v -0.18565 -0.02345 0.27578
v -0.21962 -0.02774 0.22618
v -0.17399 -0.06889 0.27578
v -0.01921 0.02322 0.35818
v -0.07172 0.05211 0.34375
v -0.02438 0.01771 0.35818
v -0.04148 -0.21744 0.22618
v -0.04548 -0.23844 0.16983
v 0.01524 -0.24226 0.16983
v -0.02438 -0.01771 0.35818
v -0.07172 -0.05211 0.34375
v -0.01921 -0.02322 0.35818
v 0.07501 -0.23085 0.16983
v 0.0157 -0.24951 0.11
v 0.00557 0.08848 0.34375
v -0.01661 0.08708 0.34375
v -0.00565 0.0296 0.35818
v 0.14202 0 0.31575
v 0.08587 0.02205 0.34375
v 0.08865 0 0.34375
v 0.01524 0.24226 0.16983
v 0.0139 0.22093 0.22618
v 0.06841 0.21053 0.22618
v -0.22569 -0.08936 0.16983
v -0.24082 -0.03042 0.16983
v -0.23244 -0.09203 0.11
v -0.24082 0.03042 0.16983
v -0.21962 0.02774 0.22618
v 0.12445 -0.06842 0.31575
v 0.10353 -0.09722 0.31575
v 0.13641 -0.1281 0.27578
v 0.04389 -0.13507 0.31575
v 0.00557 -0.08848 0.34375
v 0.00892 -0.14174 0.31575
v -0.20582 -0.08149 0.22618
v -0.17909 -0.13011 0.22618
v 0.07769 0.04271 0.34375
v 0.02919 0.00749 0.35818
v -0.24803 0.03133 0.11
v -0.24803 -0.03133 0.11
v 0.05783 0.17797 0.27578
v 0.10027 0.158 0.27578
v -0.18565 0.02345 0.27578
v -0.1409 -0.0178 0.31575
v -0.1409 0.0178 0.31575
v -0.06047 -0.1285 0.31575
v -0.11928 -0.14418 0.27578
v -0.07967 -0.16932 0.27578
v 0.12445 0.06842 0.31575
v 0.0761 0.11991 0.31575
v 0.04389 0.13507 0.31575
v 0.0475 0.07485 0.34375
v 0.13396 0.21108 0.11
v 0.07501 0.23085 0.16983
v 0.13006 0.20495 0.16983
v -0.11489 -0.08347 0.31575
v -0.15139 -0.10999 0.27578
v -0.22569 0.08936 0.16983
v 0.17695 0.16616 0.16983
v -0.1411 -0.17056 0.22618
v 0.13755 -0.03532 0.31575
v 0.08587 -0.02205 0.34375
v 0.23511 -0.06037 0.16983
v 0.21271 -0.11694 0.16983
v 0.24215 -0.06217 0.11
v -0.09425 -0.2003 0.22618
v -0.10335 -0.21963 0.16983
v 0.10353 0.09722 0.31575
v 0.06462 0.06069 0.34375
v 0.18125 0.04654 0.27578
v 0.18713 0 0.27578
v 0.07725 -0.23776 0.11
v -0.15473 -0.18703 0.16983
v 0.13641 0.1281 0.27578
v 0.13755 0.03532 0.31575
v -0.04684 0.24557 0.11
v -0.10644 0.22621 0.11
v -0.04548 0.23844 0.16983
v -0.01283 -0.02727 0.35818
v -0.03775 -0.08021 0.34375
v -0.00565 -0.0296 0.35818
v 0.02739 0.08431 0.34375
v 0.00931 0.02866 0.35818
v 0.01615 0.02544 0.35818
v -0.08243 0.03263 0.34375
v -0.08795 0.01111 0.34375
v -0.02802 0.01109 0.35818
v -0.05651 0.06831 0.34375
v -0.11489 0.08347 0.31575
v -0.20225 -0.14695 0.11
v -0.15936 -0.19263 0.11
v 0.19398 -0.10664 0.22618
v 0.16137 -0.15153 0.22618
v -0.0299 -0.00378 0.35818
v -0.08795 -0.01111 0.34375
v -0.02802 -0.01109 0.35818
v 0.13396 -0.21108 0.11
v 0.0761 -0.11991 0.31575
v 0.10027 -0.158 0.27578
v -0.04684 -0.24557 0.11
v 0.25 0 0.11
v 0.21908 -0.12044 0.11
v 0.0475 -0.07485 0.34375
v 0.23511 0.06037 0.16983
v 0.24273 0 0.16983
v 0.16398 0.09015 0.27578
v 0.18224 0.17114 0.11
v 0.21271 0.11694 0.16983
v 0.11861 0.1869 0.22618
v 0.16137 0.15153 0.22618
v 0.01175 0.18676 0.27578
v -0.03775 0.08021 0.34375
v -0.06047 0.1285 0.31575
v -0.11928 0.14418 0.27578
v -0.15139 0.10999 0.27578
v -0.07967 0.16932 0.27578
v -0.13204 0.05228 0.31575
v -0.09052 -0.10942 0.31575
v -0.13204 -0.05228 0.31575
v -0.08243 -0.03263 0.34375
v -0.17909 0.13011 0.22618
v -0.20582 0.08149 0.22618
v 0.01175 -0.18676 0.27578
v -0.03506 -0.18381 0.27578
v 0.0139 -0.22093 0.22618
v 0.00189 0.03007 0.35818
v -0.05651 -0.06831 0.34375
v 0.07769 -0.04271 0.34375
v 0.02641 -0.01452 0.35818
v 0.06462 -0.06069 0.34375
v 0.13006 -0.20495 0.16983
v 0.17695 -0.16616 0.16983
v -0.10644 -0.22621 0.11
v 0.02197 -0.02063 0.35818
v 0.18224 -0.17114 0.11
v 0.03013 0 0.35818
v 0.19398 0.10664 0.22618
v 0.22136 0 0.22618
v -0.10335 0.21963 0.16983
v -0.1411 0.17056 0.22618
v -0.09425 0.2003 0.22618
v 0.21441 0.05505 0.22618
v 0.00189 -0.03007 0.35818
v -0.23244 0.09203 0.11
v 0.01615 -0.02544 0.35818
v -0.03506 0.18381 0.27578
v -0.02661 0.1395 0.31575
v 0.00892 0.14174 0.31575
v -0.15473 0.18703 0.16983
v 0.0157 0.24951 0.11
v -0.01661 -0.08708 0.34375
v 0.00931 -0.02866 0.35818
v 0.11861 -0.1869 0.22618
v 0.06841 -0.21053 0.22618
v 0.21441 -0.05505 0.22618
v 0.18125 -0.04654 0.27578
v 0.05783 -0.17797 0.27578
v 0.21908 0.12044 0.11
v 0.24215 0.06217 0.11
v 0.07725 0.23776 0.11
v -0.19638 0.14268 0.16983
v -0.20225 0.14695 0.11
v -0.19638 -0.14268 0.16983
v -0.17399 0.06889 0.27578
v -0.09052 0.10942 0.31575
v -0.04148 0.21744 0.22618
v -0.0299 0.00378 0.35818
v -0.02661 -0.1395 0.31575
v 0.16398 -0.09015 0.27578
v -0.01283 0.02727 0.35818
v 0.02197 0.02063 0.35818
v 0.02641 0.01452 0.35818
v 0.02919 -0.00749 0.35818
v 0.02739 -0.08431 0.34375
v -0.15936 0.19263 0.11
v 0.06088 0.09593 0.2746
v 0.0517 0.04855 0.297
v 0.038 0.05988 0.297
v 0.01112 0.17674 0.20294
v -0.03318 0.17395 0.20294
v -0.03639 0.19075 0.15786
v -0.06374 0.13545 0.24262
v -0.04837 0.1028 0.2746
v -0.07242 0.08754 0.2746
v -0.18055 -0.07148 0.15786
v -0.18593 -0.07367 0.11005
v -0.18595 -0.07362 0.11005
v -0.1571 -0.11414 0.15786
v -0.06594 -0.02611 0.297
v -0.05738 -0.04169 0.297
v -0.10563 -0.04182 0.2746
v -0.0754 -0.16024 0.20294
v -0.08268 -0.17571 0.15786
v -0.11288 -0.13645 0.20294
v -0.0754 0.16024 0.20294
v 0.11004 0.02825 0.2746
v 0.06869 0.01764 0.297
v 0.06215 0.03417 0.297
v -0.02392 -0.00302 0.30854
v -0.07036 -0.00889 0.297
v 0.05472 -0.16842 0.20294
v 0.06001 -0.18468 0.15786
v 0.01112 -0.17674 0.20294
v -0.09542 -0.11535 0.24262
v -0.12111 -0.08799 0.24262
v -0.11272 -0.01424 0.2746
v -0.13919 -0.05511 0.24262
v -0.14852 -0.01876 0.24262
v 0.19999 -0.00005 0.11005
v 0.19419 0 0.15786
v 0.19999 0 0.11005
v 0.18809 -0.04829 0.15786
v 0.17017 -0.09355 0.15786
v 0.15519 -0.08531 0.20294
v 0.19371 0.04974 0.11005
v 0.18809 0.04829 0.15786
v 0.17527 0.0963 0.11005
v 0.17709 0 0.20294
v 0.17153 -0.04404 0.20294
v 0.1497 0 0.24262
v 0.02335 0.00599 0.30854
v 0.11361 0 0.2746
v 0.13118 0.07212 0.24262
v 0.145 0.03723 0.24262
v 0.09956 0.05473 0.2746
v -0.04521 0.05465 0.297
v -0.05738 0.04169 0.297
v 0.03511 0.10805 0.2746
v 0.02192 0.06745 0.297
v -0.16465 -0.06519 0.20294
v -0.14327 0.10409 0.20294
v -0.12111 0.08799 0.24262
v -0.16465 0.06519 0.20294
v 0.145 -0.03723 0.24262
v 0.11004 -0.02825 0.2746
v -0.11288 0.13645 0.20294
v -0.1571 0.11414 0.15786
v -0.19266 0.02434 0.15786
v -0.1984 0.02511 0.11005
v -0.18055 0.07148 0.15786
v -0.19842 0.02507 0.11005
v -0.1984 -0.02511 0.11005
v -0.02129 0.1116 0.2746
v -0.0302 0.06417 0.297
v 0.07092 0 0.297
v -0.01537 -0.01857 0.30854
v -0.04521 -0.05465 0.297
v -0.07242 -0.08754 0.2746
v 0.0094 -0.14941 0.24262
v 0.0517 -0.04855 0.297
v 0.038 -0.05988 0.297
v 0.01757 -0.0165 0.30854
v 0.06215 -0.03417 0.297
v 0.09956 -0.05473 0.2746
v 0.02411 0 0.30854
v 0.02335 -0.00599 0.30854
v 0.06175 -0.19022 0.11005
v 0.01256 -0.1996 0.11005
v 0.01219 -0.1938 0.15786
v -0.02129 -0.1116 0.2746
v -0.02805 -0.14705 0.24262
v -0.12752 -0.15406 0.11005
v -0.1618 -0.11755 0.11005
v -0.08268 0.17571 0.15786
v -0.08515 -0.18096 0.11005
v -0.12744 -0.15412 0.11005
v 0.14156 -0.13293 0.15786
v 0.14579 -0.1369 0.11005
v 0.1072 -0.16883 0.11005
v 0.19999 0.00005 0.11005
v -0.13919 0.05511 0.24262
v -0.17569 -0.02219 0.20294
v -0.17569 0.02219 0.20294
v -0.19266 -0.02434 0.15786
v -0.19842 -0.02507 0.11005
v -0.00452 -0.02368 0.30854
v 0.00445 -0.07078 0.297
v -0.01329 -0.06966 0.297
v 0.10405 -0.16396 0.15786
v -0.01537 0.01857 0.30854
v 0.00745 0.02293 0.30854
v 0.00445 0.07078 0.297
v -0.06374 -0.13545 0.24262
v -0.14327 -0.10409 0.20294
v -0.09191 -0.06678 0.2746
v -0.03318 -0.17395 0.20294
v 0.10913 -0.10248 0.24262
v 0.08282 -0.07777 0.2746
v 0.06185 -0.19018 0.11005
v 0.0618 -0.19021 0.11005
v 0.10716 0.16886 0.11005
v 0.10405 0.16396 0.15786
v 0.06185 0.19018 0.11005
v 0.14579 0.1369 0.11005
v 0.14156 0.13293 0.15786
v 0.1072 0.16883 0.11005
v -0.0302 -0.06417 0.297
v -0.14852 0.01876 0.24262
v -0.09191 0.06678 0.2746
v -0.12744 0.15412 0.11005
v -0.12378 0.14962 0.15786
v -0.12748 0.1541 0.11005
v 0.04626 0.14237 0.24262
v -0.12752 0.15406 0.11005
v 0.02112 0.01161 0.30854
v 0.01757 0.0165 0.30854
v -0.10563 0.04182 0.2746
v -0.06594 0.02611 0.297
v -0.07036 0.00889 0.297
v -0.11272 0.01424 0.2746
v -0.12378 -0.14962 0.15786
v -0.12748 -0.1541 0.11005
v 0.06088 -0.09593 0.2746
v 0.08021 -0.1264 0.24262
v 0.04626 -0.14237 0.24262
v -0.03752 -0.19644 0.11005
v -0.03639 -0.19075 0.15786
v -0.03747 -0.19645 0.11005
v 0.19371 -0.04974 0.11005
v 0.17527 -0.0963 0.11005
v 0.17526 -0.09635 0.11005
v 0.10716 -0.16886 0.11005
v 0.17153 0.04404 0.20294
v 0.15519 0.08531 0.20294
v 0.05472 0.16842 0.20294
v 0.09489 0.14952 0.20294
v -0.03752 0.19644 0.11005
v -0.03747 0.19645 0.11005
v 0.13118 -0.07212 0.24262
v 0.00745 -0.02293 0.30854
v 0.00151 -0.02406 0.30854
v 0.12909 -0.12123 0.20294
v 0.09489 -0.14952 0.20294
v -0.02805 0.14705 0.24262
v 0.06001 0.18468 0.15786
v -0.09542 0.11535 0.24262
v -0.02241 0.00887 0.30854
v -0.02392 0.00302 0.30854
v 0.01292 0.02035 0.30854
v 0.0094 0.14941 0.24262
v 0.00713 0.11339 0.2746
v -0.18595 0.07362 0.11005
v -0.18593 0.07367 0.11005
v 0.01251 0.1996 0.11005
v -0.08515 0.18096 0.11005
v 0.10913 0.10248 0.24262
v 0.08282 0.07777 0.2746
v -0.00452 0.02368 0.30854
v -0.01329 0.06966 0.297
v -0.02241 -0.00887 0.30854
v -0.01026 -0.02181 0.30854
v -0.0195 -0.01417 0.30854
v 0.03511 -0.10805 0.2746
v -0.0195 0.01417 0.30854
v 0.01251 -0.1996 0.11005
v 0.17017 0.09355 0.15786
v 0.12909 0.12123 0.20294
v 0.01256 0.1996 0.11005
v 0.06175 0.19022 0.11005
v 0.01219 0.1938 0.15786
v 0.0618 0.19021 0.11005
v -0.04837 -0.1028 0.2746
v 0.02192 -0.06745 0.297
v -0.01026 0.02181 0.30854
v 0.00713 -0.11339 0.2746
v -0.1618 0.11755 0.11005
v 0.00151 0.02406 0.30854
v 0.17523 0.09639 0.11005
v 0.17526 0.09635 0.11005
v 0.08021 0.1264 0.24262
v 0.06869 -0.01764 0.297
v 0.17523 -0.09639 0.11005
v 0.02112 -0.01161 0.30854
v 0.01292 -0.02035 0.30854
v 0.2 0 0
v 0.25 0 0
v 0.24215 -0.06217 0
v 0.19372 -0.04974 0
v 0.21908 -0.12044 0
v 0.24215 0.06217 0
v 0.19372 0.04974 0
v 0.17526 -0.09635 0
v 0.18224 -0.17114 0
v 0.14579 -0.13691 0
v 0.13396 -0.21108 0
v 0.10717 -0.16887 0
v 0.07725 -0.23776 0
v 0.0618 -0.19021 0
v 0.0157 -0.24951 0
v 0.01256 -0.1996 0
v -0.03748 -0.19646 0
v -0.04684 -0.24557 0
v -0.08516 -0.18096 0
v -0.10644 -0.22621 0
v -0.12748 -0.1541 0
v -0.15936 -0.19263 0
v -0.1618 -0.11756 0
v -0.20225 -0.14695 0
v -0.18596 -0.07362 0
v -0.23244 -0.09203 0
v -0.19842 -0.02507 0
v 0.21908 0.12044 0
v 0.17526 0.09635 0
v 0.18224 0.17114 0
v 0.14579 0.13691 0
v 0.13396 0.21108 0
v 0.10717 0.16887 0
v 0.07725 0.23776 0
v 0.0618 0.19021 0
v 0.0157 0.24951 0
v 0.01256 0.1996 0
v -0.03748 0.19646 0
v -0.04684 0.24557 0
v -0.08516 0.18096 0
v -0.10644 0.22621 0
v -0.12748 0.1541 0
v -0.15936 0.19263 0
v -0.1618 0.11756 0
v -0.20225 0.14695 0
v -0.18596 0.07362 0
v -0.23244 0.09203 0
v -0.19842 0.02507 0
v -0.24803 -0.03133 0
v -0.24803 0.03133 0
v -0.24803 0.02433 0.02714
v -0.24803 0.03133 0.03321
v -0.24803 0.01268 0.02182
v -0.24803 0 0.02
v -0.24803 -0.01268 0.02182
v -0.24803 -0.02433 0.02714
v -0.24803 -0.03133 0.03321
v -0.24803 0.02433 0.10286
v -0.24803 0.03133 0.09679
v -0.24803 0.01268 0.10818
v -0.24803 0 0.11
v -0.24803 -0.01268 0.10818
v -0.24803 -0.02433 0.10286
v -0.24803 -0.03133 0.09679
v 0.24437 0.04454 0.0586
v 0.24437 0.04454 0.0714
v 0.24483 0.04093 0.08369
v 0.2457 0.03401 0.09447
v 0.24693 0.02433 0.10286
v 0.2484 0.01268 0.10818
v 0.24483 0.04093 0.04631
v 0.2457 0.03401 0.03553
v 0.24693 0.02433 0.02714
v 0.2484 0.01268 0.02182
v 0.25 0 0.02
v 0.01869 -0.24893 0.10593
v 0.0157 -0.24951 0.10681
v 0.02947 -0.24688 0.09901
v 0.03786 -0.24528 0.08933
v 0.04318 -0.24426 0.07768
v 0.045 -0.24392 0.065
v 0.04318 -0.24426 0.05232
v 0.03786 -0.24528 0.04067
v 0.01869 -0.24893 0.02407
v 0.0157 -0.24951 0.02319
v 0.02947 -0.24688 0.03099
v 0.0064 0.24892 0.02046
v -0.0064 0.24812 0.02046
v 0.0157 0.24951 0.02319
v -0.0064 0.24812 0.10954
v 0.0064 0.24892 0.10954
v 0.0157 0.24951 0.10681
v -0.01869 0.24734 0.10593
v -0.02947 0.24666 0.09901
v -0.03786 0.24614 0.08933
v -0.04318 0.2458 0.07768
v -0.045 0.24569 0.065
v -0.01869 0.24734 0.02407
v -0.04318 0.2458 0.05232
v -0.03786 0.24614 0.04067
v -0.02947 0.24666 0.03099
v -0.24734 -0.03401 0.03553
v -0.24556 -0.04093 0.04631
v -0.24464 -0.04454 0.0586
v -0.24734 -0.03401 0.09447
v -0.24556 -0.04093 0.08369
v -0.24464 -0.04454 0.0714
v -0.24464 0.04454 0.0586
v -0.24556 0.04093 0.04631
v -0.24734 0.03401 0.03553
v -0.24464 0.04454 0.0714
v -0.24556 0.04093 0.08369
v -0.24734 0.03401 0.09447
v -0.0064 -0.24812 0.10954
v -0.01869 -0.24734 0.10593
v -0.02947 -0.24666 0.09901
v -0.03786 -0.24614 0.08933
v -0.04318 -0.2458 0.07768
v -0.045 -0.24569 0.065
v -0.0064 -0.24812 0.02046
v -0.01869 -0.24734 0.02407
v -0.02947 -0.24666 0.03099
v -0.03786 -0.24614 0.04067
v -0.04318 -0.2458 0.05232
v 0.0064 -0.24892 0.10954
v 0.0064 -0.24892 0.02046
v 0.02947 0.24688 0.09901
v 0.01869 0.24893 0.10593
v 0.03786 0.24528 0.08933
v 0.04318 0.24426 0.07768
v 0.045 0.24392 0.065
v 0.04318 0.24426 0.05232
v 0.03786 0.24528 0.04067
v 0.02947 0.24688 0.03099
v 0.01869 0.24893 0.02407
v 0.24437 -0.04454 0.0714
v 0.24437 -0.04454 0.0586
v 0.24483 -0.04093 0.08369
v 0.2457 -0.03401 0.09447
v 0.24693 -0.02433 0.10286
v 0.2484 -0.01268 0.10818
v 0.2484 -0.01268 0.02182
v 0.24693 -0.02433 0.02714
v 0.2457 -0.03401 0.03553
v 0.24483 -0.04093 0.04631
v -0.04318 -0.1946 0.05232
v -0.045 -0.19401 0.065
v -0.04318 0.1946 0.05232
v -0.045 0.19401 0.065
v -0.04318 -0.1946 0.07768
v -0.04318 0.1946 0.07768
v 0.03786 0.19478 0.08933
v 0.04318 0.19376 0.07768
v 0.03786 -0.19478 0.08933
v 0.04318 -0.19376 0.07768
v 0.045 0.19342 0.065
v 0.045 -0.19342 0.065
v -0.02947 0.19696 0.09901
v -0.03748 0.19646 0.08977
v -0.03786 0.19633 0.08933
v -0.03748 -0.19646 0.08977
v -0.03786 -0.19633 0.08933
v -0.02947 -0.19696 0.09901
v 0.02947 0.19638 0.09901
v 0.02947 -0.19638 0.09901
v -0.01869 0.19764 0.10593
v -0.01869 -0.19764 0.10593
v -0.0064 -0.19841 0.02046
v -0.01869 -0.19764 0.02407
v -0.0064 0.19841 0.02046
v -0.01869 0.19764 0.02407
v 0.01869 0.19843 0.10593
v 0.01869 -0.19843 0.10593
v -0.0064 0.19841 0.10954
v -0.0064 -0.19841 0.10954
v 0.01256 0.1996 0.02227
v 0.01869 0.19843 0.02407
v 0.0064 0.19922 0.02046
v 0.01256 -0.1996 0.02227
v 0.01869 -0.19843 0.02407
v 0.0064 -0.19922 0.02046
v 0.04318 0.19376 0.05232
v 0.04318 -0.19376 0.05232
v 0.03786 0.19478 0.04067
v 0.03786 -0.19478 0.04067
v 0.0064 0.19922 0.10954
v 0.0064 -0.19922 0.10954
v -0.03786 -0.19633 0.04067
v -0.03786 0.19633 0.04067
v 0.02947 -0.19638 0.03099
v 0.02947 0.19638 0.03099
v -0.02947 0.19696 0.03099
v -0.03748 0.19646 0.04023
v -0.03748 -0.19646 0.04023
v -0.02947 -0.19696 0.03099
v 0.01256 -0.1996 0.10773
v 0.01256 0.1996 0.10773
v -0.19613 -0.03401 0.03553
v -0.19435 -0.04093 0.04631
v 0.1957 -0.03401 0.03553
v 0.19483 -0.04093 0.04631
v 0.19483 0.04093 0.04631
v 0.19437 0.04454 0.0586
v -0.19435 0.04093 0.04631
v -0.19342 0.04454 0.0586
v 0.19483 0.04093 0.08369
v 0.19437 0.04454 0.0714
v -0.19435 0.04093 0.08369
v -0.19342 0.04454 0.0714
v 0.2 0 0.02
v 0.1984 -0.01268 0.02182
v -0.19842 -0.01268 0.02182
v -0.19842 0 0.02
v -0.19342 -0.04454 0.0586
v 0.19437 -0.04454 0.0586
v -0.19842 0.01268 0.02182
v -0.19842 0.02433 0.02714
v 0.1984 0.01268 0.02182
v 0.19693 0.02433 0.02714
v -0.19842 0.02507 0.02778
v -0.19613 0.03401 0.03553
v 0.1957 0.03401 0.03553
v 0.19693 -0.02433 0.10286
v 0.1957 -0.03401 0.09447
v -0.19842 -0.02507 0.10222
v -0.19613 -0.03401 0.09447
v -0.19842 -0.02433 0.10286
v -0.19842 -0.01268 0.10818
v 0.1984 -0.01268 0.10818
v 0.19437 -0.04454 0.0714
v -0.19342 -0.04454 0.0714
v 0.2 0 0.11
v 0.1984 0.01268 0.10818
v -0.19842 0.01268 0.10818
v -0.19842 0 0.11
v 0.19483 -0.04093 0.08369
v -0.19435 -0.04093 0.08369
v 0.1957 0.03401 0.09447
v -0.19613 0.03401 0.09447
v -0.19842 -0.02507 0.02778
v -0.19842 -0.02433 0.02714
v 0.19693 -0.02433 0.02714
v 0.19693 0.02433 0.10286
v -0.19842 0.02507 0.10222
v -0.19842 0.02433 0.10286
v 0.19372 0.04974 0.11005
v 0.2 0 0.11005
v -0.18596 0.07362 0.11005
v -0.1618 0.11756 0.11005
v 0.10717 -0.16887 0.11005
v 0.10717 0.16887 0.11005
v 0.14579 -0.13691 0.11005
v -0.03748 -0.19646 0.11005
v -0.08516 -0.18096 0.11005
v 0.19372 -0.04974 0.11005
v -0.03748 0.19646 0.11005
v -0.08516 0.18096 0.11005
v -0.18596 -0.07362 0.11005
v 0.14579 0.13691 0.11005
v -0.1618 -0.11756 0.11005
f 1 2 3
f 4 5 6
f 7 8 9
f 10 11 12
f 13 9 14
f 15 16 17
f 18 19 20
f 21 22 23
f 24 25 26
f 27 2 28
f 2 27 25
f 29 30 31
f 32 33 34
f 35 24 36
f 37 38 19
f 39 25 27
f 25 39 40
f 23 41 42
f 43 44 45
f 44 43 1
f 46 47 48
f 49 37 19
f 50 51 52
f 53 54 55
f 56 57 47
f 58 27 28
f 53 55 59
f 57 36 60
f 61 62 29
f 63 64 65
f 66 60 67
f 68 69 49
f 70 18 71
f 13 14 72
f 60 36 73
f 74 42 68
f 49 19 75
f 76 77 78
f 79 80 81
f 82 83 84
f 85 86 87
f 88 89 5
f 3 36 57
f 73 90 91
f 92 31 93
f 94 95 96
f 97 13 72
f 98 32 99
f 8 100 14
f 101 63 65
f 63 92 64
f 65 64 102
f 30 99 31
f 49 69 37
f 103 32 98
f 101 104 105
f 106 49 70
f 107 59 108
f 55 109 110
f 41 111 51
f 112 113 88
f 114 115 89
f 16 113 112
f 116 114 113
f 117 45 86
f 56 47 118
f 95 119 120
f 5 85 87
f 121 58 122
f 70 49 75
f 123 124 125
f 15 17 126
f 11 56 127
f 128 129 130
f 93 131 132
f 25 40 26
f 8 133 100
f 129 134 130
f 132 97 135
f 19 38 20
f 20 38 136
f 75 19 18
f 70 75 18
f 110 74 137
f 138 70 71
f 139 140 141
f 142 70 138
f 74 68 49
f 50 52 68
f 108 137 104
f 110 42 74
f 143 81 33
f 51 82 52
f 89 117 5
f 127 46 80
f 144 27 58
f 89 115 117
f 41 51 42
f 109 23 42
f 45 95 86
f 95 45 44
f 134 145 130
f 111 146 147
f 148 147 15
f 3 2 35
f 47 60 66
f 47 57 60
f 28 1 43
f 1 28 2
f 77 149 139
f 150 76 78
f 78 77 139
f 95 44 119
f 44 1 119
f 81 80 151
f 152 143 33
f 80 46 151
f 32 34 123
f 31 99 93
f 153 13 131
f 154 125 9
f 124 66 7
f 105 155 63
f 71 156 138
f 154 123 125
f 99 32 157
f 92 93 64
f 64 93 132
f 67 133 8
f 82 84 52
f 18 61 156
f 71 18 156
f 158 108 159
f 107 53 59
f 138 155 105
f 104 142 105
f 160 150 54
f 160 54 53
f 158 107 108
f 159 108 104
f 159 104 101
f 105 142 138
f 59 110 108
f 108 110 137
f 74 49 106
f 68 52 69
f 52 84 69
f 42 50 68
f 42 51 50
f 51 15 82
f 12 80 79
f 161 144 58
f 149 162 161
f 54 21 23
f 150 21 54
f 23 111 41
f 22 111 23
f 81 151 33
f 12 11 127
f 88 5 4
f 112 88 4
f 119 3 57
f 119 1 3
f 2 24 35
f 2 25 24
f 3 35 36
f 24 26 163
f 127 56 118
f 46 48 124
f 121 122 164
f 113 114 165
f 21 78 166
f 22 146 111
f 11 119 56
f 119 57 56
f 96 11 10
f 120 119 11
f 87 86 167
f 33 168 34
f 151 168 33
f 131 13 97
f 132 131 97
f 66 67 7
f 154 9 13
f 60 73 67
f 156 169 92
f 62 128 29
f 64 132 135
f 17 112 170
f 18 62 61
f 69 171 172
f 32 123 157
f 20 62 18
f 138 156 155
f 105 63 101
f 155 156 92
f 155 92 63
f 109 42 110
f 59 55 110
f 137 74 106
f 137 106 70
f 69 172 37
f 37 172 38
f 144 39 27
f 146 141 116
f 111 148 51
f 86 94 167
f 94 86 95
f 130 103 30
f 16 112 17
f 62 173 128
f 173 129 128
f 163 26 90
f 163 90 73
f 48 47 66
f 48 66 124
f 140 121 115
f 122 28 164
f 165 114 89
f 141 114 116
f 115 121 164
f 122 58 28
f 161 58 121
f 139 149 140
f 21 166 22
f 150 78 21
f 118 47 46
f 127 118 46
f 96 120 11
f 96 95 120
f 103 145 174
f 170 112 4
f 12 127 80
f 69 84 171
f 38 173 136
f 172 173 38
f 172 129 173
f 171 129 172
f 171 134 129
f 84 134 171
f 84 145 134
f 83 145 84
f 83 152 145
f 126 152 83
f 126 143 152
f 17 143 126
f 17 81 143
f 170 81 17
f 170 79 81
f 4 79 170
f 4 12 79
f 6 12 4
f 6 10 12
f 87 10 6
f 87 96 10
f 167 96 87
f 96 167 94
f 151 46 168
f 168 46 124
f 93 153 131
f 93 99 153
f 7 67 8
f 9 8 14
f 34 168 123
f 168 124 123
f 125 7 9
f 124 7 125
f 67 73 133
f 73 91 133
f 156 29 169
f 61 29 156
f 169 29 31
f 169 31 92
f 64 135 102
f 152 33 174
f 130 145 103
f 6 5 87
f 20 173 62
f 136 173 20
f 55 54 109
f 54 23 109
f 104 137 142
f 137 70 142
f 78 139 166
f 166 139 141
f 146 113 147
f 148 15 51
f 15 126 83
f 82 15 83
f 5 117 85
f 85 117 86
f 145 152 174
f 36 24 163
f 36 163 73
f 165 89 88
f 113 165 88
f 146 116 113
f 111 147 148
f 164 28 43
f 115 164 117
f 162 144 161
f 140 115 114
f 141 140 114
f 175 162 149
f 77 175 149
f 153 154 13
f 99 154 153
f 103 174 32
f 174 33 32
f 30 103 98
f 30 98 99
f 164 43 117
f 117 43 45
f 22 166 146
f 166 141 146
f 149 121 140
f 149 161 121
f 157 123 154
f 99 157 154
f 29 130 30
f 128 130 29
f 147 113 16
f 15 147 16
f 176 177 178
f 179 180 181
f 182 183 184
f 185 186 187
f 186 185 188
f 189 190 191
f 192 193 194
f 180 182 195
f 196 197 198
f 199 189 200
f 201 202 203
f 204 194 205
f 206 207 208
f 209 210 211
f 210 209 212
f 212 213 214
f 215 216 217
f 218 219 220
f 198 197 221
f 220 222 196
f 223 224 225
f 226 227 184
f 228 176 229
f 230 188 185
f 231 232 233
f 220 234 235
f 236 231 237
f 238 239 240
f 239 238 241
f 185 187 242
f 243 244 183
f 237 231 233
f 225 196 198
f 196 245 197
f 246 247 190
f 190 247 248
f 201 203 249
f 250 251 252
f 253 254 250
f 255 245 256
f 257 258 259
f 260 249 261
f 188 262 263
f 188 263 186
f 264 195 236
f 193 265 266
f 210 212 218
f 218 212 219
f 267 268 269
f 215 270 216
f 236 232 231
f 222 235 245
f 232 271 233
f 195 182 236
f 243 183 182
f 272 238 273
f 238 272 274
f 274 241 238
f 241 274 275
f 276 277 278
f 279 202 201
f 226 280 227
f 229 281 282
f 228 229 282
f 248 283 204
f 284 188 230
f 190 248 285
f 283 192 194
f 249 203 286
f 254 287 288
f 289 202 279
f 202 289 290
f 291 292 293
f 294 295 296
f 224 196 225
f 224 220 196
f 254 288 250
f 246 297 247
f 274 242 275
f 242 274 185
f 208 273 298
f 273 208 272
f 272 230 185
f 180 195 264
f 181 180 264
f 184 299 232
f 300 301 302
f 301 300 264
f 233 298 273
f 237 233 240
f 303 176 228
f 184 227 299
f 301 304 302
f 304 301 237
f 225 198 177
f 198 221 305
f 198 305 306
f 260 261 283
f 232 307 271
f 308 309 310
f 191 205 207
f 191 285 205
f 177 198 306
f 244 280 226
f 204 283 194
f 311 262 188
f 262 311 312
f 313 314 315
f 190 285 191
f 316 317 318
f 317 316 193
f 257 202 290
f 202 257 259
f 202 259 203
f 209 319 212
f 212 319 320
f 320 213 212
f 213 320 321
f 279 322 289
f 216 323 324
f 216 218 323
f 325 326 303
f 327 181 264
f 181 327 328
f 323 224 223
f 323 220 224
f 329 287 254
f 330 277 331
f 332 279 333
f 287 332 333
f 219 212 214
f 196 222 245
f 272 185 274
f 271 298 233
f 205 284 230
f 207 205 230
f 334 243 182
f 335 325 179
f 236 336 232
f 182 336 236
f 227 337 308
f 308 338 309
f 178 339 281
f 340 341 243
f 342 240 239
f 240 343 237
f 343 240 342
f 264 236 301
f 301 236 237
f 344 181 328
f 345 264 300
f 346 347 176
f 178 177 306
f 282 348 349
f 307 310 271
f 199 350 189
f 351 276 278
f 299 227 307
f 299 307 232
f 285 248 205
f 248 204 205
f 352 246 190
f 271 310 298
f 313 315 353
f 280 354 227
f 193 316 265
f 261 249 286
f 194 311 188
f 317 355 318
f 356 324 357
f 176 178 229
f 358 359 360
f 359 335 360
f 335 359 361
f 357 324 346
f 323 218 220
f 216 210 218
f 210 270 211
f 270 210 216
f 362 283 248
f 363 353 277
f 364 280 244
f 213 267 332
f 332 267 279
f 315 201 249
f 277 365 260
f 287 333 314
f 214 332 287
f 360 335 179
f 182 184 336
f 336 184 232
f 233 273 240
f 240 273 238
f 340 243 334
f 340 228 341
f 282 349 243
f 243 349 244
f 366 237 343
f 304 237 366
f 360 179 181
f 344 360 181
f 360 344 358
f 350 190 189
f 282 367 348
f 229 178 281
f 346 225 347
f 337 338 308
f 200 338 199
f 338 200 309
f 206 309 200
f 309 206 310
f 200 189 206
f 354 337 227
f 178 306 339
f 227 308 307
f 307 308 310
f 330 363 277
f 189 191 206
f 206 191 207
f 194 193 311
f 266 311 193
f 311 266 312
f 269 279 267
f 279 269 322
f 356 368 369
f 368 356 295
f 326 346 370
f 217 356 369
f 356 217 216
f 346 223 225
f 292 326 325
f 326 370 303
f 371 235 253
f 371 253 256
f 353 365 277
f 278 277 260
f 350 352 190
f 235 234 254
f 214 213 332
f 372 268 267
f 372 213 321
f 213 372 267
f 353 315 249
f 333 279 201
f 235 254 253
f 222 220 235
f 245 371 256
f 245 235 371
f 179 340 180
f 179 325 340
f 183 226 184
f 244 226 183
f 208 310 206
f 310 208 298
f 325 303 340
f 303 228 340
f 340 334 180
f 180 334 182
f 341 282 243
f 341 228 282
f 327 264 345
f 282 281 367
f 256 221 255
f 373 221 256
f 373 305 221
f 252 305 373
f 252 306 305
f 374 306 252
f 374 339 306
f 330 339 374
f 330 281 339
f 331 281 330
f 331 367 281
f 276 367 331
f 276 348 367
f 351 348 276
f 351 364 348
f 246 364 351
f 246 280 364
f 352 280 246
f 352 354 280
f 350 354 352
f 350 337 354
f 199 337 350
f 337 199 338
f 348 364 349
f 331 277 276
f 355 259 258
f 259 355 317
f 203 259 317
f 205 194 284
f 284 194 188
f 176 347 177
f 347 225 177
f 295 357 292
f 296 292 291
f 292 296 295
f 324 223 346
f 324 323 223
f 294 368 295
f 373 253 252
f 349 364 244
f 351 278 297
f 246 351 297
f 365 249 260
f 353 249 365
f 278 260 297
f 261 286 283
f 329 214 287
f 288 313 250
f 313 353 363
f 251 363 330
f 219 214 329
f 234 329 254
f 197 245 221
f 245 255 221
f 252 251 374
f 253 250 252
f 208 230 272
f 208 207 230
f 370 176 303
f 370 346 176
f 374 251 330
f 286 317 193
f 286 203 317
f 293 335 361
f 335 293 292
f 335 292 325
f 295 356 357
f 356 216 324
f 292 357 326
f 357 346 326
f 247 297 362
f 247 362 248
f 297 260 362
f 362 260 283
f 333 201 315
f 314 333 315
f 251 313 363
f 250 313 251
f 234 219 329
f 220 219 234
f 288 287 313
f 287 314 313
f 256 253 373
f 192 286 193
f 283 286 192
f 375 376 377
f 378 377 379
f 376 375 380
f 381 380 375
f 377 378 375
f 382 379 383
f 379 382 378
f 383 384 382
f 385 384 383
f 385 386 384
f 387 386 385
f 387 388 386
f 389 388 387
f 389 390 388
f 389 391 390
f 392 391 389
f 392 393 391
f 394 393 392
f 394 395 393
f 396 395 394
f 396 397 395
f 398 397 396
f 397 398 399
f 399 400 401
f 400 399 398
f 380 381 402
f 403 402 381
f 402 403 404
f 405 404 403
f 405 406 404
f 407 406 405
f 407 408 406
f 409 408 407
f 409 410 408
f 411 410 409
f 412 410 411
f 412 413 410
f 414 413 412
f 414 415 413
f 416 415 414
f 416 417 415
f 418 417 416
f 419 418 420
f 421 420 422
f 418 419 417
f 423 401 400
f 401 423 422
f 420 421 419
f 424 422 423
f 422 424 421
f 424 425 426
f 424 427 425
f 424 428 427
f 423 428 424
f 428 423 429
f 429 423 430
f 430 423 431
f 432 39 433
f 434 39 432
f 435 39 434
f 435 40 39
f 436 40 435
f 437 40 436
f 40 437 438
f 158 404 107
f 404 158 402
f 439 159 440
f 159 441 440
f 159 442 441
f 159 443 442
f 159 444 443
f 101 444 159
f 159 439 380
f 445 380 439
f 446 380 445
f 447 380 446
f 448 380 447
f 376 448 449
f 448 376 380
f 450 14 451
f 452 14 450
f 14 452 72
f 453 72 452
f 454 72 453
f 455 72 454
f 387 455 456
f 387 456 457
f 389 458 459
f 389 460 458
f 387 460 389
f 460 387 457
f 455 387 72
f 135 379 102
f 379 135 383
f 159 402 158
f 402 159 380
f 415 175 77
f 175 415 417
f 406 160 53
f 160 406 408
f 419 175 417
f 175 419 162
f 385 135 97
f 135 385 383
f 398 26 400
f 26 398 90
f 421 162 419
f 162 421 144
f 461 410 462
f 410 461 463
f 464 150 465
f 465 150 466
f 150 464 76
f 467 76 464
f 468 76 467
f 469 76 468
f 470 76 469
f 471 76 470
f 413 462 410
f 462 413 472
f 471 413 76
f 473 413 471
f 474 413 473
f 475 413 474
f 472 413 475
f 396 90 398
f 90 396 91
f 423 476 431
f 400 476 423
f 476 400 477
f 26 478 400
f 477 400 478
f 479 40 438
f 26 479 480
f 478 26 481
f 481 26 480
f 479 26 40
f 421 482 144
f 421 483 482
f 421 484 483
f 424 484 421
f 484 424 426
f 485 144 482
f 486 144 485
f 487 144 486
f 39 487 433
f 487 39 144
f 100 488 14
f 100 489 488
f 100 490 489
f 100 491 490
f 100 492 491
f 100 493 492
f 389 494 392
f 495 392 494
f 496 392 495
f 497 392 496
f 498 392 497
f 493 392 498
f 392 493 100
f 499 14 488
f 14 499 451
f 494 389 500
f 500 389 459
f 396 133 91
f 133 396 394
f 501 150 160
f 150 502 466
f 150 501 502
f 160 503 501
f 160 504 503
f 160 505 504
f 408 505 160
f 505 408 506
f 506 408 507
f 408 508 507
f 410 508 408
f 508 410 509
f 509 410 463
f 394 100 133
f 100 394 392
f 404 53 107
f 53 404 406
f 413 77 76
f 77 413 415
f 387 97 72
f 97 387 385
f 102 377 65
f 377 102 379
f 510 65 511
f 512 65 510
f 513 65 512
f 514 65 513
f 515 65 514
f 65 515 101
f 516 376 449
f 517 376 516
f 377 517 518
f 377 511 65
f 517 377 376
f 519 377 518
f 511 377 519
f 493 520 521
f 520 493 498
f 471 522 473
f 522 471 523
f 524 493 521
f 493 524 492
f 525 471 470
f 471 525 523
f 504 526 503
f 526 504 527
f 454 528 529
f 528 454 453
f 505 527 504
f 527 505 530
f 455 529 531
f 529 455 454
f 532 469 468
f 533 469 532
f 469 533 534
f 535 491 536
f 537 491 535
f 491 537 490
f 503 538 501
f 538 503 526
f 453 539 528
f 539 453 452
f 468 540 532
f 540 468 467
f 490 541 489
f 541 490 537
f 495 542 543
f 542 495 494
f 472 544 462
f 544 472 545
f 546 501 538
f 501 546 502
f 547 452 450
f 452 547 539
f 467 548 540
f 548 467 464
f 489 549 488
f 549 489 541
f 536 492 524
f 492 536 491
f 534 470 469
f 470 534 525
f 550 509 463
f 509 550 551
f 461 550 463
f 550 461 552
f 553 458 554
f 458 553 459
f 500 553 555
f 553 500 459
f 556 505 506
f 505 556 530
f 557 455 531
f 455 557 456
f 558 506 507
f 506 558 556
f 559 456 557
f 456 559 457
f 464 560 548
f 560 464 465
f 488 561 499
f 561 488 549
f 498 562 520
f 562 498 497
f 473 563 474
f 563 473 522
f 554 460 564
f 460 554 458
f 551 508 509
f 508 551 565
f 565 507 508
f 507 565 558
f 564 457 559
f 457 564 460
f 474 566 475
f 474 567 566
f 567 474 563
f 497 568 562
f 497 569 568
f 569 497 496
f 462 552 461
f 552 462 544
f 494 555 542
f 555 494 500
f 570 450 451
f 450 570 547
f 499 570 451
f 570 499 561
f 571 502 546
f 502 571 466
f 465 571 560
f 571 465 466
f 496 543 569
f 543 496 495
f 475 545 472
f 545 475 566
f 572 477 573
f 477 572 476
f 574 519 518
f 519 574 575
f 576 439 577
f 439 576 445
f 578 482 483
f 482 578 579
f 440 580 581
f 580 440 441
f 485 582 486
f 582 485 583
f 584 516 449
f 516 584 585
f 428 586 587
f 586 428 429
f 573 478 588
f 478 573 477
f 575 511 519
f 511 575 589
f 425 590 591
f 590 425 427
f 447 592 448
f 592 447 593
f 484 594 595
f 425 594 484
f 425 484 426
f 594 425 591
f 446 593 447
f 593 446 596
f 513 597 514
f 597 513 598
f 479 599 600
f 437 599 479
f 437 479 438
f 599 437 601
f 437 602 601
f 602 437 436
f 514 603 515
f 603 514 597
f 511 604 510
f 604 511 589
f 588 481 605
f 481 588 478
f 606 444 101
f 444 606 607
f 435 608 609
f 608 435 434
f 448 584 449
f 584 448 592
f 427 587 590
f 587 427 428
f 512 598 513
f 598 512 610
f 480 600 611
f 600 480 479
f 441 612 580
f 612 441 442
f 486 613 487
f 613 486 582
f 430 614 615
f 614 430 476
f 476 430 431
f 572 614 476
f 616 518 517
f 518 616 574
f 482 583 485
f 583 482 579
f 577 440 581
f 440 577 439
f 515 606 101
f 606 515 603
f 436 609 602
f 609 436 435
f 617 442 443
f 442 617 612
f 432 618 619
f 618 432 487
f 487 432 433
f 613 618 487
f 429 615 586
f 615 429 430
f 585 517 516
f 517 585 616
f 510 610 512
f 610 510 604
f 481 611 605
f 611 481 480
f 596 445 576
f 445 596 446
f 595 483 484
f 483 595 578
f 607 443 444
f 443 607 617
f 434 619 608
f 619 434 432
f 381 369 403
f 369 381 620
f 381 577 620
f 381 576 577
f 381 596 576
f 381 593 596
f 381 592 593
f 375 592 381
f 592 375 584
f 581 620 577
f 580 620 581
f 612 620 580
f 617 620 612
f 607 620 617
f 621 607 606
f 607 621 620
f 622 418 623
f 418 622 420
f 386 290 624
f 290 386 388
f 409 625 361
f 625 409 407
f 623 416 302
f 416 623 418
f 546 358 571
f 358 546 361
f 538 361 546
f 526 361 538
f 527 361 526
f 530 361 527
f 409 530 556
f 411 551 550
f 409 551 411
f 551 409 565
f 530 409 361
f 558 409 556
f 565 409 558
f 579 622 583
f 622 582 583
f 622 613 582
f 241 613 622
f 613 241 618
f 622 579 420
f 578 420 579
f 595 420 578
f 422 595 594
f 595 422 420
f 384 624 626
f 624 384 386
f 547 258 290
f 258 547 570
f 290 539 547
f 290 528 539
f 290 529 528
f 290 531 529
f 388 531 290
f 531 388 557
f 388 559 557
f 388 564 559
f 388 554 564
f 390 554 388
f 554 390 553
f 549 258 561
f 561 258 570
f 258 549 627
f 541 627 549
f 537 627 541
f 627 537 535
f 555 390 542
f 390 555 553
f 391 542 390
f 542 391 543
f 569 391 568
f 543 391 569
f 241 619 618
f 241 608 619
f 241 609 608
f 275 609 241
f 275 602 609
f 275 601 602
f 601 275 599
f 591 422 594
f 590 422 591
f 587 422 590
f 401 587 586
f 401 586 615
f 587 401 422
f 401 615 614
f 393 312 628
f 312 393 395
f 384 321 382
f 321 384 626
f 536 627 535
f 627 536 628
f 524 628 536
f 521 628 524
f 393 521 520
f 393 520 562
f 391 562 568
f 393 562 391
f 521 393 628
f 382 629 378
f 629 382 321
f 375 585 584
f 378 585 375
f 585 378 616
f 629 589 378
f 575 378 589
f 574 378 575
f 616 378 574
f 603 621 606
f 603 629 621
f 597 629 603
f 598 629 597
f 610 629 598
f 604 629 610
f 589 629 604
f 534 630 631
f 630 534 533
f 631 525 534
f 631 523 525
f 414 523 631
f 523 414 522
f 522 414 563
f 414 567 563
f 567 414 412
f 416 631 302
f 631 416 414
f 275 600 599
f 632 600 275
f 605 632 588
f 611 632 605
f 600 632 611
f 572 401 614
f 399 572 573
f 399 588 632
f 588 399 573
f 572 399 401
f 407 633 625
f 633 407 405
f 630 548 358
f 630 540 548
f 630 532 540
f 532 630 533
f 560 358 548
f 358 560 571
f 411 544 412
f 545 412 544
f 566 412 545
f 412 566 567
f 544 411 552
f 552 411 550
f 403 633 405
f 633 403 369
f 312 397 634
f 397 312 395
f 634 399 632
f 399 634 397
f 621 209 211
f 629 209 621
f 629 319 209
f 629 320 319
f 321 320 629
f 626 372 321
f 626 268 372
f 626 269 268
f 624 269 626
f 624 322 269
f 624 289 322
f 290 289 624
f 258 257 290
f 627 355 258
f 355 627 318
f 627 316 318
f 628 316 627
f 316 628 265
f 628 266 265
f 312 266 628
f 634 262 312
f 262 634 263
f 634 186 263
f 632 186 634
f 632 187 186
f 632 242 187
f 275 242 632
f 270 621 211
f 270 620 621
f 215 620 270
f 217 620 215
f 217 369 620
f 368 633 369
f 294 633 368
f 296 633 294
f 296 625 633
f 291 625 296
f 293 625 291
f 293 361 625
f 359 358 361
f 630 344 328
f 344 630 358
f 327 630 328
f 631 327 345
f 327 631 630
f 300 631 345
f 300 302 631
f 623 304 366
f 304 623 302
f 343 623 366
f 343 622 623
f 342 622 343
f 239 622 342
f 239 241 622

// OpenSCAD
eps = 0.0001;
hole_attach_height = 0.02;
outer_radius = 0.25;
hole_radius = 0.045;
thickness = 0.05;
hole_twist = 0;
//other params
inner_radius = outer_radius - thickness;
fn = outer_radius * 100;
fnh = hole_radius * 500;

difference() {
    union() {
        difference() {
            //sphere
            translate([0,0,hole_radius*2 + hole_attach_height])
            sphere(r=outer_radius, $fn = fn);
            
            //shelling
            translate([0,0,hole_radius*2 + hole_attach_height])
            sphere(r=inner_radius, $fn = fn);
            
            translate([0,0,-outer_radius])
            cylinder(h=outer_radius, r= outer_radius, $fn = fn);
        }
        
        //attach segment
        cylinder(h=hole_radius*2 + hole_attach_height, r = outer_radius, $fn = fn);
    }
    
    translate([0,0,-outer_radius -eps/2])
    cylinder(h=hole_radius*2 + hole_attach_height + outer_radius + eps, r = inner_radius, $fn = fn);
    
    translate([0,0,hole_attach_height + hole_radius]) 
    rotate([0,0,hole_twist]){
        rotate([90,0,0])
        cylinder(h=outer_radius * 2 + eps, r = hole_radius, center=true, $fn = fnh);
        rotate([0,90,0])
        cylinder(h=outer_radius * 2 + eps, r = hole_radius, center=true, $fn = fnh);
    }
    
}
